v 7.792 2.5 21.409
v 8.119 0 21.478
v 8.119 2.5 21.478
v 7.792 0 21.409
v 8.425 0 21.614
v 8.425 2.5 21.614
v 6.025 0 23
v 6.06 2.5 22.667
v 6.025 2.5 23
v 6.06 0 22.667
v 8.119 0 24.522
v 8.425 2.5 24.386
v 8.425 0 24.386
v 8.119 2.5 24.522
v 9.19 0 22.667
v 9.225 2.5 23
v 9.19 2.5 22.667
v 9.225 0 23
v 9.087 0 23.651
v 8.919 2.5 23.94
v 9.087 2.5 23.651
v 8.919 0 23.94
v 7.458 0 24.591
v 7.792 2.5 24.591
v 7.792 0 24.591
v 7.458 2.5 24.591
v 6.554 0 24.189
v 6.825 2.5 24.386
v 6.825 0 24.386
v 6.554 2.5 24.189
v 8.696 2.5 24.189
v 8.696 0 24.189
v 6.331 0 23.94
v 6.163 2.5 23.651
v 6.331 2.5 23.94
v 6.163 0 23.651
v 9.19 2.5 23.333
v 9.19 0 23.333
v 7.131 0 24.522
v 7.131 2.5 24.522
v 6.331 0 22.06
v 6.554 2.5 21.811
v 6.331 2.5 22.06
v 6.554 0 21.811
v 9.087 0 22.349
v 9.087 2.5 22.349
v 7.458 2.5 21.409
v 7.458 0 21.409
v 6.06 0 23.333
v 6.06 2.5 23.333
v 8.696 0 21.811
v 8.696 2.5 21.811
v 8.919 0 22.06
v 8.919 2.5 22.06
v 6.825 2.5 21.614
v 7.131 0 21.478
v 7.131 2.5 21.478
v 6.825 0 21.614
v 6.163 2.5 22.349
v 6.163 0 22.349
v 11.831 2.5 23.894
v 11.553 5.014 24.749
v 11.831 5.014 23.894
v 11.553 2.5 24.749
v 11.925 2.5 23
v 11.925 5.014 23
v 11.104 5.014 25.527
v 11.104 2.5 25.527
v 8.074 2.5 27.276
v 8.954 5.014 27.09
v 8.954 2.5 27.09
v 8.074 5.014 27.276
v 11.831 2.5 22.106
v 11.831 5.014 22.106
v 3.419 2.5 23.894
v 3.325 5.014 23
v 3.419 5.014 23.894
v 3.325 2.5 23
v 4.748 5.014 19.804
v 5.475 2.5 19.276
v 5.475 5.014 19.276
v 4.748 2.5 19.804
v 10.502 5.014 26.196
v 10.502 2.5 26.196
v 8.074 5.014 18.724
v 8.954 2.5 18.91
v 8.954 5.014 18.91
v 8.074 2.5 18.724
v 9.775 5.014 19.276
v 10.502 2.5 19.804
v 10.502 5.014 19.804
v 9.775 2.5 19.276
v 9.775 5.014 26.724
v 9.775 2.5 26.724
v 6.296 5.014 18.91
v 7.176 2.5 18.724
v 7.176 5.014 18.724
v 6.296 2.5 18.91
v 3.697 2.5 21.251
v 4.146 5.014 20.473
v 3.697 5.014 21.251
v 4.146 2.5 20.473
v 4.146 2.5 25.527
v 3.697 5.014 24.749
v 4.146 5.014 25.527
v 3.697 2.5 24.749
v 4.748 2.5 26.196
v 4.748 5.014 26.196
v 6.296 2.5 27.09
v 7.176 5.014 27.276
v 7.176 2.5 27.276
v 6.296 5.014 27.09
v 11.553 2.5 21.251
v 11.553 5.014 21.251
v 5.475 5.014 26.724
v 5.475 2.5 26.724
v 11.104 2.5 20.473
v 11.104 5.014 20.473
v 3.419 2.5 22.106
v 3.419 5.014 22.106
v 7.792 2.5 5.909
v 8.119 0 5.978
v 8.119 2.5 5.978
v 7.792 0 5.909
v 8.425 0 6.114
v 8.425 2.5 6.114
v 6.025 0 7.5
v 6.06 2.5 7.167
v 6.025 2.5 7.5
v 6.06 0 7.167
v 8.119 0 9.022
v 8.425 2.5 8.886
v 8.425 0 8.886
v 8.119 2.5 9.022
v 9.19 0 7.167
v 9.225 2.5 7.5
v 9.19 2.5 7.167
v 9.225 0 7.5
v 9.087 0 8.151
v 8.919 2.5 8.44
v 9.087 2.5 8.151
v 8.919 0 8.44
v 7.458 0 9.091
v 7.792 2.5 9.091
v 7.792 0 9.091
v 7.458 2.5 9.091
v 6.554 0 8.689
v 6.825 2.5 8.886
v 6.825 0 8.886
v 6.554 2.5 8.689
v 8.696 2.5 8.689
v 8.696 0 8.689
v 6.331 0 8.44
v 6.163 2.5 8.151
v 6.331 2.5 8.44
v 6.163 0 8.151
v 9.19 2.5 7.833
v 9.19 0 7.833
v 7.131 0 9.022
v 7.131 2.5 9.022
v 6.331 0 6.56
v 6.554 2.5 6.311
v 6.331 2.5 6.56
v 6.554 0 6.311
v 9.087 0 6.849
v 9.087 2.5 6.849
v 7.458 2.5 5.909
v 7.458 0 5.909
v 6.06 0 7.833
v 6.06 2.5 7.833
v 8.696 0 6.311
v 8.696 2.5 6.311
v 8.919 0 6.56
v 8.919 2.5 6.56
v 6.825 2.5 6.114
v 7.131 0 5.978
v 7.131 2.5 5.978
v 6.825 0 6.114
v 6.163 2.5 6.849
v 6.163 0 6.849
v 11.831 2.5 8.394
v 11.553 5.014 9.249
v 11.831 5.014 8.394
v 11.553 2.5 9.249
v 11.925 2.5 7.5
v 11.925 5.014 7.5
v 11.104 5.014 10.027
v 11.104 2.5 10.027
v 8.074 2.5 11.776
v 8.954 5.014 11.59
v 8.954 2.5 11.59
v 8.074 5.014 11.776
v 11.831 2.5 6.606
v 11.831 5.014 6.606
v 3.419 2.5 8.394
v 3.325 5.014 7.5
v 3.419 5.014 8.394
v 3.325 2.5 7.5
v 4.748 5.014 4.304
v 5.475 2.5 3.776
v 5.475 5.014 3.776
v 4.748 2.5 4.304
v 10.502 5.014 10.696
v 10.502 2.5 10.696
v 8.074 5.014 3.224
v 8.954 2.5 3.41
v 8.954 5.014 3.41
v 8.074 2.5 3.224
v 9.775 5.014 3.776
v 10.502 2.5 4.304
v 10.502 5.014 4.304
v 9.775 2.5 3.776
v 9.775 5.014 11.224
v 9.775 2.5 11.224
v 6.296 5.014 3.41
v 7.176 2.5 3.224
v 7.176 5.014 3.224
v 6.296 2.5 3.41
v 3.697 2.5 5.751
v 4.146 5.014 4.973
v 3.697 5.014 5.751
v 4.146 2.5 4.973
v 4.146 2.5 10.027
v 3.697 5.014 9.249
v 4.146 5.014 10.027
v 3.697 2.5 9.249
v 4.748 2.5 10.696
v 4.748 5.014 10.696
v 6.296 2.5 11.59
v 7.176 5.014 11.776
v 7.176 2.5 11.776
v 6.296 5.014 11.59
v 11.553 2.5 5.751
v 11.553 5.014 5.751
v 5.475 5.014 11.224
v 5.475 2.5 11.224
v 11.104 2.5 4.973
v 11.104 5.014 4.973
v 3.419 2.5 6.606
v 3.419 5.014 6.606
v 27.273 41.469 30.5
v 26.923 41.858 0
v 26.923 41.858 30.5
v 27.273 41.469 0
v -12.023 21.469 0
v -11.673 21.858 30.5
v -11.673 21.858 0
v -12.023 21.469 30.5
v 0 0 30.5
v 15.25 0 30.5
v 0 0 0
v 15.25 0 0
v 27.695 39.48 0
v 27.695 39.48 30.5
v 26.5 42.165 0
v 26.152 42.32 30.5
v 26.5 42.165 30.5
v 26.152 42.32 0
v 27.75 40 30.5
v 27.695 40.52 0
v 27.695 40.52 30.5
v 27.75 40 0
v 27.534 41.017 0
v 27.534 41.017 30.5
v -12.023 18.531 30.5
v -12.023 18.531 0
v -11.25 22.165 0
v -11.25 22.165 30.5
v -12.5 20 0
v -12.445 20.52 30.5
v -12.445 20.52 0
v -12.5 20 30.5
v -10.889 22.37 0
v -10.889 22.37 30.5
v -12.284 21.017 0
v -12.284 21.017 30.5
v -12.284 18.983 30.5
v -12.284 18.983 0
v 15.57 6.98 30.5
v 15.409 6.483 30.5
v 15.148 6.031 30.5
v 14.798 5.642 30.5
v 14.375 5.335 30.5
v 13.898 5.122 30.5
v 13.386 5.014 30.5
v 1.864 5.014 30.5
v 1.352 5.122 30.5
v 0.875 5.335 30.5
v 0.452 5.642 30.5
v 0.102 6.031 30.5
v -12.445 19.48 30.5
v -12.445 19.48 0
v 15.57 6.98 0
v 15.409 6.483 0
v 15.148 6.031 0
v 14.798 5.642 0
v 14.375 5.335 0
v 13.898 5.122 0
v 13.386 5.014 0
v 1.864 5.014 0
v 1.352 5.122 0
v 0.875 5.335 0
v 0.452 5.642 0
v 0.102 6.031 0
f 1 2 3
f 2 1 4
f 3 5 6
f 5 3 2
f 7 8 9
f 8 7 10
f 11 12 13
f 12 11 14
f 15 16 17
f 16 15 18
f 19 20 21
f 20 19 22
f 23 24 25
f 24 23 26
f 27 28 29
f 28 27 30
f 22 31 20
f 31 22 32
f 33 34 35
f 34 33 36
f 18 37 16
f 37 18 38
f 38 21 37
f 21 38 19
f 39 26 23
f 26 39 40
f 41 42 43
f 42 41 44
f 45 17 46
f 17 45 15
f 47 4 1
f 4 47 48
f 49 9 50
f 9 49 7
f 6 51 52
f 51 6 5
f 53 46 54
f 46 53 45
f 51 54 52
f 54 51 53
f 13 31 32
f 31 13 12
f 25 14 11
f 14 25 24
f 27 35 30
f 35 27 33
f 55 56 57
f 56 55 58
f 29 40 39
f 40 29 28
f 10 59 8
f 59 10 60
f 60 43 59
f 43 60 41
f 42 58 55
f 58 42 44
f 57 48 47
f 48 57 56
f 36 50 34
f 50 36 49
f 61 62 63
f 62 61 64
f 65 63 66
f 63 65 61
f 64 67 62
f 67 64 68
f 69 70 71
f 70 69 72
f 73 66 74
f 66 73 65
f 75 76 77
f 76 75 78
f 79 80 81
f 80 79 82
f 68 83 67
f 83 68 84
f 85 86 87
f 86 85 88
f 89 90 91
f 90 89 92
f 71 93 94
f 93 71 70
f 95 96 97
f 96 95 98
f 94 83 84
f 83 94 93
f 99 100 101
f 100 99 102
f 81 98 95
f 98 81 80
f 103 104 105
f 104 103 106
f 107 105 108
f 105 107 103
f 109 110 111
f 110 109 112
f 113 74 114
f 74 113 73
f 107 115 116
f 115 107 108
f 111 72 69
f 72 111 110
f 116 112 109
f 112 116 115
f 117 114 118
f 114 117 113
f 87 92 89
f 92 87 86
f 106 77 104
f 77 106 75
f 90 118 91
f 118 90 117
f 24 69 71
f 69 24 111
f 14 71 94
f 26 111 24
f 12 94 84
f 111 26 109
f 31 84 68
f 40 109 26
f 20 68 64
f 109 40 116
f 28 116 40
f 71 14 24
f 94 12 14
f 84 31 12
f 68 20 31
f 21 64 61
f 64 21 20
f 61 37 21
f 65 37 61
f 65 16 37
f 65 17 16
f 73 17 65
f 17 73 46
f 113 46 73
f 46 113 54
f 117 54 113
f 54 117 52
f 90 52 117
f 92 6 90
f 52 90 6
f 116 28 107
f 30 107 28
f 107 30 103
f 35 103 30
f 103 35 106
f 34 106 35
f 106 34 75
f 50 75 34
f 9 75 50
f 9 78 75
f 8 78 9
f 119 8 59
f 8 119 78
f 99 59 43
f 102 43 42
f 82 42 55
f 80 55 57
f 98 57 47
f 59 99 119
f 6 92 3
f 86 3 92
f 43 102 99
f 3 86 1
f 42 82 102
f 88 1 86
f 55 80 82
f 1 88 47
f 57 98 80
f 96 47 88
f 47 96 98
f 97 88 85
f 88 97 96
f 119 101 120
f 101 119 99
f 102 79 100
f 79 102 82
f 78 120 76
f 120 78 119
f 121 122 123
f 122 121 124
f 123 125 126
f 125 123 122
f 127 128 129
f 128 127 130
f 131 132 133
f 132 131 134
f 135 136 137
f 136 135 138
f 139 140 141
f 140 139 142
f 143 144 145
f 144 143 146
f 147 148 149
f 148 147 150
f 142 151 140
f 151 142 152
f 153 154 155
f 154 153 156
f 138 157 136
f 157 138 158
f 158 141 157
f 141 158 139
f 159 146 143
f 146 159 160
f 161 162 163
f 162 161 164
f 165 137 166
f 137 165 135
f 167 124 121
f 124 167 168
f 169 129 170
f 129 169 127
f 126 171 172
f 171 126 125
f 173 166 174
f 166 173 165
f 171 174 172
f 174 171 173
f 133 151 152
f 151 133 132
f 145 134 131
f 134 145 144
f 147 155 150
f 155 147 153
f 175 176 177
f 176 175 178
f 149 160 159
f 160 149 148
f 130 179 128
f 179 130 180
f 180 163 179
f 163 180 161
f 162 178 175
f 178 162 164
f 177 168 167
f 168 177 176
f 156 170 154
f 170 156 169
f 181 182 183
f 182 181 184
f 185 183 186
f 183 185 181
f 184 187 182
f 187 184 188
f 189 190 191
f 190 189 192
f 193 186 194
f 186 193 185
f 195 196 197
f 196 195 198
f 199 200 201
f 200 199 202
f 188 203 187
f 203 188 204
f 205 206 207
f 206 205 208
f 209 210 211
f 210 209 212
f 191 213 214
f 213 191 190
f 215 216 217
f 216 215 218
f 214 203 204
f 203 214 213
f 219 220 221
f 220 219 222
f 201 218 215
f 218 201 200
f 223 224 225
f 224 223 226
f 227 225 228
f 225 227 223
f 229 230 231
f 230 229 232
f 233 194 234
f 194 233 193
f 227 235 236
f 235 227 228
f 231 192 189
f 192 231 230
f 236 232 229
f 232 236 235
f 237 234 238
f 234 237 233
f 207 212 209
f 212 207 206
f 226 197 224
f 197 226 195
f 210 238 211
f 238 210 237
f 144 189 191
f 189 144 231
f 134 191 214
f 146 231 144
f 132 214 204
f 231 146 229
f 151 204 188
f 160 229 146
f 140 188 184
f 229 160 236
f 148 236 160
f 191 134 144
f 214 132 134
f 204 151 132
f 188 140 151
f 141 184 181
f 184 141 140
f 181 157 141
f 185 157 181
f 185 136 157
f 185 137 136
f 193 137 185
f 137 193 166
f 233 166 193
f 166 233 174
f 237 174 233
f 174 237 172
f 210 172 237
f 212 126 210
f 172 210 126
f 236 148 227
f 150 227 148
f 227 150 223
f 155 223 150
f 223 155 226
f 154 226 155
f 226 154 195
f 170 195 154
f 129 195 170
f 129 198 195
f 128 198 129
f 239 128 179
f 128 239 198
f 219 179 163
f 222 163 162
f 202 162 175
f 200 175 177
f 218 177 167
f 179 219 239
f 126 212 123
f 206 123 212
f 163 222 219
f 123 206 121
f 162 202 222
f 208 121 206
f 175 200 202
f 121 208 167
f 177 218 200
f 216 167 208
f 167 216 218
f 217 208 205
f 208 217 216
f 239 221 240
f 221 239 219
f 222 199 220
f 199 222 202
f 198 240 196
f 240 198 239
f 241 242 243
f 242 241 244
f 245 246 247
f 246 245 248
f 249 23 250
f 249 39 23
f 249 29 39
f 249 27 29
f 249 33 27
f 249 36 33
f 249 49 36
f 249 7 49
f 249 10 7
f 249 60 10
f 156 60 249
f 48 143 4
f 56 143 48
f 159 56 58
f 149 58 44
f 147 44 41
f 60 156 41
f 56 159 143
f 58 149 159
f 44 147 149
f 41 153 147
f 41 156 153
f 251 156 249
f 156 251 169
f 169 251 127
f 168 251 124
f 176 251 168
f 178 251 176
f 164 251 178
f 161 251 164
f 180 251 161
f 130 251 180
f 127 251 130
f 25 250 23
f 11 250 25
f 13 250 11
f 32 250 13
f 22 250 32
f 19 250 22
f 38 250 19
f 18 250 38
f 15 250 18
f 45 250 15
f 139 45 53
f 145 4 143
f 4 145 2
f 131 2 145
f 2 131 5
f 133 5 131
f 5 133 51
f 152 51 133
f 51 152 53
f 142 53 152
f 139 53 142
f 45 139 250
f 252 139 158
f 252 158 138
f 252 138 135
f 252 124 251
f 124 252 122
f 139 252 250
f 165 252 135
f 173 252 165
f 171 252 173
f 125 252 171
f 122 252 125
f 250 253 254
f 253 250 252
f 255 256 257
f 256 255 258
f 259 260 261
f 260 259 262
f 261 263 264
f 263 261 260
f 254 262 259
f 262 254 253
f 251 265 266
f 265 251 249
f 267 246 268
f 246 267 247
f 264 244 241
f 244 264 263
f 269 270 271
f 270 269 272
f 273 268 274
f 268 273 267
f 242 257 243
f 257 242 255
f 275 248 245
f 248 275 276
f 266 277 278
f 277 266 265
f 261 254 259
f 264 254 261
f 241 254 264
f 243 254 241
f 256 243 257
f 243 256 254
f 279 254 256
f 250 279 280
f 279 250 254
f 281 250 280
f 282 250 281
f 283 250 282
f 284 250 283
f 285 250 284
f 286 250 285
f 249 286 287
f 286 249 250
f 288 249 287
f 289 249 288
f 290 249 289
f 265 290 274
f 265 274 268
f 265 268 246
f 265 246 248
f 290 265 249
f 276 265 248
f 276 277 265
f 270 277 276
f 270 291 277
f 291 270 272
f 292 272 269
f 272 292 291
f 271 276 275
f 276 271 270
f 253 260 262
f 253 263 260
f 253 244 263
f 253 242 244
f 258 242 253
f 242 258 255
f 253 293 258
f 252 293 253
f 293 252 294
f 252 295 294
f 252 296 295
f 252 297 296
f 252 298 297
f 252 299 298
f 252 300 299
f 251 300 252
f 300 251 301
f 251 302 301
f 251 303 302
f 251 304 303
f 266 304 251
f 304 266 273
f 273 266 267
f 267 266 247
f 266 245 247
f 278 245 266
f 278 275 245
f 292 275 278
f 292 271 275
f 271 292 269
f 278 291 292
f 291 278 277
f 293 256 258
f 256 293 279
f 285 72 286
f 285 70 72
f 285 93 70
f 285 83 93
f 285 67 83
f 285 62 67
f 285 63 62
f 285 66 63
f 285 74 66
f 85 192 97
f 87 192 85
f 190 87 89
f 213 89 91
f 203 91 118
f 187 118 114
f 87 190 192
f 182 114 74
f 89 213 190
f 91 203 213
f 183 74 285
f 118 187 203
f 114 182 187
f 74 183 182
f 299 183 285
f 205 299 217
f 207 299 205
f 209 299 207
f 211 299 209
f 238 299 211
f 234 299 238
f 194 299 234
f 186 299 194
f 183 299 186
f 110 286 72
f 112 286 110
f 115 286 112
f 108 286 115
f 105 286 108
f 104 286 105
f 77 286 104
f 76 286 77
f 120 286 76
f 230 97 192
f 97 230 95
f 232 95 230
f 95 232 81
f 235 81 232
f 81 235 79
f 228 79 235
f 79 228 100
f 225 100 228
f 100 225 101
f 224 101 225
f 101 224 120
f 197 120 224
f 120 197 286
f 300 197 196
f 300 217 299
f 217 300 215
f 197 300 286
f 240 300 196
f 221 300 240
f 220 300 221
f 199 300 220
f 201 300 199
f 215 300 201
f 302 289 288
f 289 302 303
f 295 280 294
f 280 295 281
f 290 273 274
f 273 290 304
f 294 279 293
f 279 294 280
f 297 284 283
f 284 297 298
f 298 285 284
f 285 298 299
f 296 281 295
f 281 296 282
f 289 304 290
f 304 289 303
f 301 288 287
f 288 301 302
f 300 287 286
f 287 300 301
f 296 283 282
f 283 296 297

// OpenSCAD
// file: ../888_1003.scad
include <../parameters.scad>



module 888_1003() {
	difference() {
		union() {
			hull() {
				cube([ALU_profile_width/2, 5, ALU_profile_width]);

				translate([ALU_profile_width/2+10, 40, 0])
				cylinder(d=5, h=ALU_profile_width, $fn=30);

				translate([-10, 20, 0])
				cylinder(d=5, h=ALU_profile_width, $fn=30);
			}
		}

		translate([0, 0, -1])
		hull() {
			translate([ALU_profile_width/4-5.5, 7.5, 0])
			cylinder(d=5, h=ALU_profile_width+2, $fn=30);

			translate([ALU_profile_width/4+5.5, 7.5, 0])
			cylinder(d=5, h=ALU_profile_width+2, $fn=30);

			translate([ALU_profile_width/2+8, 50, 0])
			cylinder(d=10, h=ALU_profile_width+2, $fn=30);

			translate([-10, 30, 0])
			cylinder(d=10, h=ALU_profile_width+2, $fn=30);
		}


		translate([ALU_profile_width/4, 12.5, ALU_profile_width-7.5])
		rotate([90, 0, 0])
		union() {
			cylinder(d=M3_screw_diameter, h=30, $fn=30);

			translate([0, 0, -20])
			cylinder(d=M3_nut_diameter+2, h=30, $fn=30);
		}

		translate([ALU_profile_width/4, 12.5, 7.5])
		rotate([90, 0, 0])
		union() {
			cylinder(d=M3_screw_diameter, h=30, $fn=30);

			translate([0, 0, -20])
			cylinder(d=M3_nut_diameter+2, h=30, $fn=30);
		}
	}
}

888_1003();
// file: ../../parameters.scad
maximum_printable_size = 150;

layer_thickness = 0.3;
global_clearance = 0.5;


//Screw diameter and nut for M10 [mm]
M10_screw_diameter = 10.4;
M10_head_height = 10;
M10_head_diameter = 16+0.5;
M10_nut_height = 10.5;
M10_nut_diameter = 25.5;
M10_nut_pocket = 22.3;

//Screw diameter for M8 [mm]
M8_screw_diameter = 8.6;
M8_head_height = 8;
M8_head_diameter = 13.5;
M8_nut_height = 7.5;
M8_square_nut_thin_height = 4.5;
M8_nut_diameter = 14.4 + 0.5;
M8_nut_pocket = 13 + 0.5;
M8_washer_diameter = 16;
M8_washer_thickness = 1.5;


//Screw diameter and nut for M6 [mm]
M6_screw_diameter=6.5;
M6_head_diameter = 10+0.5;
M6_head_height = 6;
M6_nut_height = 4.9;
M6_nut_diameter = 11.8;
M6_nut_pocket = 10.4;
M6_square_nut_height = 3;
M6_square_nut_diameter = 10;
M6_washer_thickness = 1.6;

//Screw diameter and nut for M5 [mm]
M5_screw_diameter=5.5;
M5_head_height = 5;
M5_head_diameter = 13+0.5;
M5_nut_height = 4.5;
M5_nut_diameter = 9.4;
M5_nut_pocket = 8.4;

//Screw diameter and nut for M4 [mm]
M4_screw_diameter=4.5;
M4_screw_head_height = 4;
M4_nut_height = 3.2;
M4_nut_diameter = 8.4;
M4_nut_pocket = 7.5;

//Screw diameter and nut for M3 [mm]
M3_screw_diameter = 3.2;
M3_nut_height = 2.7;
M3_nut_diameter = 6.6;
M3_nut_pocket = 5.6;
M3_screw_head_height = 3;

//Screw diameter and nut for M2,5 [mm]
M2_5_screw_diameter = 2.7;
M2_5_nut_height = 2.3;
M2_5_nut_diameter = 6;
M2_5_nut_pocket = 5.5;

//ALU profile
ALU_profile_width = 30.5;
ALU_profile_holder_wall_thickness = 3;
ALU_profile_groove_width = 8;





// Platform parameters ////////////////////////////////////////////
// Main profile parameters
starting_platform_length = 1000; // Main platform profile length
starting_platform_angle = 10; // Angle of attack for platform

// Main cube profile lengths
profile_length_x = 600;
profile_length_y = 600;
profile_length_z = 260;


// Compressor dimensions
compressor_length_x = 410;
compressor_length_y = 140;
compressor_length_z = 310;

// Platform front support parameters
front_holder_width = 160;
front_holder_angle = 25;
front_holder_height = 60;
front_holder_offset = 15;
front_holder_height_offset = 110;

// Lock moving servo parameters
// static par.
servo_length = 40;
servo_width = 20;
servo_height = 40;
servo_axle_offset = 12.5;
servo_axle_height = 5;
servo_movement_angle = 60;
servo_movement_angle_offset = -35; // angle offset up
servo_force = 1.65; // [N/m] torque of servo

// dynamic par.
servo_arm_length = servo_width/2+ALU_profile_width/2+ALU_profile_holder_wall_thickness+4;
servo_travel_y = cos((servo_movement_angle-abs(servo_movement_angle_offset))/2)*servo_arm_length;
servo_arm_hole_length = (servo_arm_length/cos(servo_movement_angle/2))-servo_arm_length+M3_screw_diameter;
servo_joint_offset = sin(servo_movement_angle+servo_movement_angle_offset)*(servo_arm_length+servo_arm_hole_length)+servo_axle_offset;
servo_joint_offset_by_angle = -tan(servo_movement_angle_offset)*servo_arm_length;
servo_max_linear_force = servo_force/(servo_arm_length/1000); // max servo linear force [N]
servo_min_linear_force = cos(servo_movement_angle+abs(servo_movement_angle_offset))*servo_max_linear_force; // min servo linear force [N] in the most extreme position
servo_holding_linear_force = cos(servo_movement_angle+servo_movement_angle_offset)*servo_max_linear_force; // min servo linear force [N] in holding position

// Lock static parameters
lock_screws_dia = 3.2;
lock_depth = 20;
lock_axle_diameter = 15;
lock_grab_axle_dia = 13;
lock_arms_joint_offset = 30;
lock_arms_joint_angle = 90-.01;
lock_tooth_width = 2;

lock_tube_angle = 0;

// Lock dynamic parameters
lock_push_force = (servo_holding_linear_force/cos(lock_arms_joint_angle))/cos(lock_arms_joint_angle); // lock arm pushing force on linear servo joint
lock_push_arm_length = 45;
lock_arm_force_ratio = 1; // lock arm change holding force ratio (0.5 = arm will have half holding force)
lock_hold_arm_length = lock_push_arm_length/lock_arm_force_ratio;
lock_holding_force = lock_push_force*lock_arm_force_ratio;
lock_joint_arm_length = lock_push_arm_length;
// main file
//@set_slicing_config(../../slicing/default.ini)
include <../../parameters.scad>

use <../888_1003.scad>

888_1003();
